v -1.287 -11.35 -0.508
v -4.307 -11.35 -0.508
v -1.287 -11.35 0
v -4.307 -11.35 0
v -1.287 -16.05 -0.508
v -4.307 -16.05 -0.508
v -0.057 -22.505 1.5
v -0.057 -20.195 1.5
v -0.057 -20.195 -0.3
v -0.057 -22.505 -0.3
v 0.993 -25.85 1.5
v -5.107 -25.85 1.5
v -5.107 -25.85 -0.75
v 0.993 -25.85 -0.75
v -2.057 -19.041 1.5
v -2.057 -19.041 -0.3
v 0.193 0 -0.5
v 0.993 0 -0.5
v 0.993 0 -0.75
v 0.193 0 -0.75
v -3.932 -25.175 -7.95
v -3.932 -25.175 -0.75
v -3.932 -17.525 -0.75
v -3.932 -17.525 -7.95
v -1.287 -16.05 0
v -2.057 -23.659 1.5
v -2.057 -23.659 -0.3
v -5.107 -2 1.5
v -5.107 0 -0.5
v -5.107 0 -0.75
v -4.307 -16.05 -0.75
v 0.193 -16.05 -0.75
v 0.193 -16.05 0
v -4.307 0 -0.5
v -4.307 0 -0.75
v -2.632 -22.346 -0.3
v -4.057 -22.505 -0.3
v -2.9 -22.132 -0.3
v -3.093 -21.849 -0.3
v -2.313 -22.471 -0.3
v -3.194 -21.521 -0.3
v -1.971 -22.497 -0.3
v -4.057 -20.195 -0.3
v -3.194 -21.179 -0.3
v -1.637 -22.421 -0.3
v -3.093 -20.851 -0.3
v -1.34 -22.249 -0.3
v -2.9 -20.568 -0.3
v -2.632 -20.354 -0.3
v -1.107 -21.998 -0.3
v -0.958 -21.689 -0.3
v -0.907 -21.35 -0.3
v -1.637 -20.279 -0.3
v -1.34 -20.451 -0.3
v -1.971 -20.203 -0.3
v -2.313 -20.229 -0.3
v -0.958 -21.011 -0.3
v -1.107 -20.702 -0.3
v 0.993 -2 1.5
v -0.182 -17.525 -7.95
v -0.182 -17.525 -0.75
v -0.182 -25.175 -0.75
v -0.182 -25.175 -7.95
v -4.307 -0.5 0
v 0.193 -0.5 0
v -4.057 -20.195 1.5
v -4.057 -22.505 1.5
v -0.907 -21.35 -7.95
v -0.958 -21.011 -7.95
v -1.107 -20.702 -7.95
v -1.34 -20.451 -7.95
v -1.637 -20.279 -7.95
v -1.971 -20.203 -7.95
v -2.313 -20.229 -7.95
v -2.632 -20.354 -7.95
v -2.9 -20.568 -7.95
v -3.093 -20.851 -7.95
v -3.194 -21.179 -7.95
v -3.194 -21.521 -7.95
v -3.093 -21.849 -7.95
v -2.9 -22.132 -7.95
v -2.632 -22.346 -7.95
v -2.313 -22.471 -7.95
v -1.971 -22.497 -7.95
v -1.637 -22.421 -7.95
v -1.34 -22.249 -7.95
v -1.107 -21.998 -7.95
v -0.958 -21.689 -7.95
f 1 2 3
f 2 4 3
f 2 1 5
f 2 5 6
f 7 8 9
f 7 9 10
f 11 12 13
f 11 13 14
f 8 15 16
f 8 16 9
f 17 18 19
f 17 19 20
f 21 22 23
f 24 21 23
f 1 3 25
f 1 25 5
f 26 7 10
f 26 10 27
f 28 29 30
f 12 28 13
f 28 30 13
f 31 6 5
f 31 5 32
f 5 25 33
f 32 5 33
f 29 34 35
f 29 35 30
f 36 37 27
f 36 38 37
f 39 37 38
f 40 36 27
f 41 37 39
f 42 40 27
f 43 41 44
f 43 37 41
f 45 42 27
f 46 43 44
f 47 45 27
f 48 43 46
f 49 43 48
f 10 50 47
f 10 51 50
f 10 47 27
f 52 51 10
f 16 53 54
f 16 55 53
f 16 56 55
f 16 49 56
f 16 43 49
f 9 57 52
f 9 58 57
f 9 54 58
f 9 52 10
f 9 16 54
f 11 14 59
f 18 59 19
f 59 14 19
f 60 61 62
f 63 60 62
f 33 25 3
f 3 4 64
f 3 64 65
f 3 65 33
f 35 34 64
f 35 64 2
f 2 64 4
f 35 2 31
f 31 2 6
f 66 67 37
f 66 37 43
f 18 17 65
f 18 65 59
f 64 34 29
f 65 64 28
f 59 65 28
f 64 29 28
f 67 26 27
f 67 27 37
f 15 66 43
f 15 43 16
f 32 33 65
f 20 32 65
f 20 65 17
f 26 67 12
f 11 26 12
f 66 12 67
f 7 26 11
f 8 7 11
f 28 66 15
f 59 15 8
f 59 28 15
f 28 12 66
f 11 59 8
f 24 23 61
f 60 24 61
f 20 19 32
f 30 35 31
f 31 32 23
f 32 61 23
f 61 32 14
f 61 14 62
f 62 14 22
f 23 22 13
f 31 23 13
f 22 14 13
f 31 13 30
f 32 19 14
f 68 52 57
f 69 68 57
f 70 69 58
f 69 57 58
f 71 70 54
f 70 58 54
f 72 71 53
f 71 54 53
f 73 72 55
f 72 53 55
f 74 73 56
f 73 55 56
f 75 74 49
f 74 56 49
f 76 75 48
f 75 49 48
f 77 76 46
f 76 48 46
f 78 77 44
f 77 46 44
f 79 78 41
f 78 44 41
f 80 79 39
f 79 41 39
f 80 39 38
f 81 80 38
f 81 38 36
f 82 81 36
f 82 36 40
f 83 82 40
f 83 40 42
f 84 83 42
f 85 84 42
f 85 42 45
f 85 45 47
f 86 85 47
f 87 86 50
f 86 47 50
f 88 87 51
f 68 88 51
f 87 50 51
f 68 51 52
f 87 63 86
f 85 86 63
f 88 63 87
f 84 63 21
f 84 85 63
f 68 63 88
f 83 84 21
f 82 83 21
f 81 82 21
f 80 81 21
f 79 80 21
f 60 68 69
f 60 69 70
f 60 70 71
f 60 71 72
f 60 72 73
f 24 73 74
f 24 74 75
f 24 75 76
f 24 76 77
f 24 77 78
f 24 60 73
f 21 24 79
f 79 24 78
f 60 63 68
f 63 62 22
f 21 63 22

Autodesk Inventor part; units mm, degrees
ref_plane "YZ Plane" through (0, 0, 0) normal (1, 0, 0) x (0, 1, 0)
ref_plane "XZ Plane" through (0, 0, 0) normal (0, 1, 0) x (-1, 0, 0)
ref_plane "XY Plane" through (0, 0, 0) normal (0, 0, 1) x (1, 0, 0)
ref_plane "Work Plane3" through (0, -0.0002, 0) normal (0, 0, 1) x (1, 0, 0)
sketch "Sketch8" plane through (0, -0.0002, 0) normal (0, 0, 1) x (1, 0, 0)
  line L0 (-0.007, 0.0002) -> (-0.007, -15.3498) projected
  line L1 (-0.007, 0.0002) -> (-4.107, 0.0002) projected
  line L2 (-4.107, 0.0002) -> (-4.107, -11.3498) projected
  line L3 (-5.107, -11.3498) -> (0.993, -11.3498)
  line L4 (0.993, -11.3498) -> (0.993, 0.0002)
  line L5 (0.993, 0.0002) -> (-5.107, 0.0002)
  line L6 (-5.107, 0.0002) -> (-5.107, -11.3498)
  line L7 (-4.107, -11.3498) -> (-1.0868, -11.3498) projected
  point P0 (-4.107, 0.0002)
  point P1 (-0.007, 0.0002)
  point P2 (-0.007, -11.3498)
  dimension "d71" = 1
  dimension "d72" = 1
extrude "side" add sketch "Sketch8" along normal blind 1.5
sketch "Sketch14" plane through (0, -0.0002, 0) normal (0, 0, -1) x (-1, 0, 0)
  line L0 (-0.993, 0) -> (5.107, 0) projected
  line L1 (5.107, -11.3498) -> (-0.993, -11.3498) projected
  line L2 (5.107, 0.0002) -> (4.307, 0.0002)
  line L3 (4.307, 0.0002) -> (4.307, -11.3498)
  line L4 (4.307, -11.3498) -> (5.107, -11.3498)
  line L5 (5.107, -11.3498) -> (5.107, 0.0002)
  line L6 (-0.993, -11.3498) -> (-0.193, -11.3498)
  line L7 (-0.193, -11.3498) -> (-0.193, 0.0002)
  line L8 (-0.193, 0.0002) -> (-0.993, 0.0002)
  line L9 (-0.993, 0.0002) -> (-0.993, -11.3498)
  line L10 (4.107, 0.0002) -> (4.107, -11.3498) projected
  line L11 (0.007, 0.0002) -> (0.007, -15.3498) projected
  point P0 (0, 0.0002)
  point P1 (-0.993, 0.0002)
  point P2 (-0.993, 0.0002)
  point P3 (-0.193, 0.0002)
  point P4 (4.307, 0.0002)
  dimension "d73" = 0.2
  dimension "d74" = 0.2
extrude "side_tabs" add sketch "Sketch14" along normal blind 0.75 contours L0 L7 L1 L9 | L0 L5 L1 L3
sketch "Sketch15" plane through (-5.107, -11.35, 1.5) normal (0, -1, 0) x (1, 0, 0)
  line L0 (0.8, -1.5) -> (5.3, -1.5) projected
  line L1 (5.3, -1.5) -> (5.3, -2.25) projected
  line L2 (6.1, -2.25) -> (5.3, -2.25) projected
  line L3 (0, 0) -> (6.1, 0) projected
  line L4 (0.8, -2.25) -> (0, -2.25) projected
  line L5 (0.8, -1.5) -> (0.8, -2.25) projected
  line L6 (5.3, -1.5) -> (0.8, -1.5) projected
  line L7 (1, -1.5) -> (4.0182, -1.5) projected
  line L8 (0.8, -1.5) -> (0.8, -2.25) projected
  line L9 (0.8, -1.5) -> (3.8202, -1.5)
  line L10 (3.8202, -1.5) -> (3.8202, -2.008)
  line L11 (3.8202, -2.008) -> (0.8, -2.008)
  line L12 (0.8, -2.008) -> (0.8, -1.5)
  line L13 (6.1, -2.25) -> (6.1, 0) projected
  line L14 (0, 0) -> (0, -2.25) projected
  line L15 (4.0202, -1.5) -> (4.0202, -2.8009) projected
  point P0 (5.107, -1.5)
  point P1 (3.8202, -1.5)
  dimension "d99" = 0.508
  dimension "d100" = 0.2
extrude "fill_gaps" add sketch "Sketch15" along normal blind 14.5
sketch "Sketch16" plane through (-5.107, -25.85, 1.5) normal (0, -1, 0) x (1, 0, 0)
  line L0 (5.3, -2.25) -> (6.1, -2.25) projected
  line L1 (5.3, -1.5) -> (5.3, -2.25) projected
  line L2 (3.8202, -1.5) -> (5.3, -1.5) projected
  line L3 (3.8202, -2.008) -> (3.8202, -1.5) projected
  line L4 (0.8, -2.008) -> (3.8202, -2.008) projected
  line L5 (0.8, -2.25) -> (0.8, -2.008) projected
  line L6 (0, -2.25) -> (0.8, -2.25) projected
  line L7 (5.3, -2.25) -> (0.8, -2.25)
  point P0 (5.107, -1.5)
extrude "fill_gaps_2" add sketch "Sketch16" against normal blind 9.8
chamfer "Chamfer1" distance 2 angle 45 1 edges at (-2.057, 0, 1.5)
sketch "Sketch17" plane through (0, -0.0002, -0.75) normal (0, 0, -1) x (-1, 0, 0)
  line L0 (0.007, -17.3498) -> (0.007, -25.3498) projected
  line L1 (4.107, -17.3498) -> (0.007, -17.3498) projected
  line L2 (4.107, -25.3498) -> (4.107, -17.3498) projected
  line L3 (0.007, -25.3498) -> (4.107, -25.3498) projected
  line L4 (0.182, -25.1748) -> (3.932, -25.1748)
  line L5 (3.932, -25.1748) -> (3.932, -17.5248)
  line L6 (3.932, -17.5248) -> (0.182, -17.5248)
  line L7 (0.182, -17.5248) -> (0.182, -25.1748)
  point P0 (0, 0.0002)
  dimension "d86" = 0.175
  dimension "d87" = 0.175
  dimension "d88" = 0.175
  dimension "d89" = 0.175
extrude "sliding_block" add sketch "Sketch17" along normal blind 7.2 contours L7 L6 L5 L4
ref_plane "Work Plane4" through (-2.2725, -22.3901, 1.5) normal (0, 0, 1) x (1, 0, 0)
sketch "Sketch19" plane through (-2.2725, -22.3901, 1.5) normal (0, 0, 1) x (1, 0, 0)
  circle A0 centre (0.2155, 1.0401) radius 1.15 projected
  point P0 (2.2725, 22.3901)
extrude "screw_hole" cut sketch "Sketch19" against normal through all
sketch "Sketch20" plane through (0, -0.0002, 1.5) normal (0, 0, 1) x (1, 0, 0)
  line L0 (-2.057, -19.0404) -> (-0.057, -20.1951)
  line L1 (-0.057, -20.1951) -> (-0.057, -22.5045)
  line L2 (-0.057, -22.5045) -> (-2.057, -23.6592)
  line L3 (-2.057, -23.6592) -> (-4.057, -22.5045)
  line L4 (-4.057, -22.5045) -> (-4.057, -20.1951)
  line L5 (-4.057, -20.1951) -> (-2.057, -19.0404)
  circle A0 centre (-2.057, -21.3498) radius 1.15 projected
  point P0 (0, 0.0002)
  dimension "d102" = 4
extrude "nut_slot" cut sketch "Sketch20" against normal blind 1.8 contours L0 L1 L2 L3 L4 L5 | A0
equation "\"d73\" = d74"
equation "\"d86\" = d89"
equation "\"d87\" = d89"
equation "\"d88\" = d89"
properties part number "surgical_holder_side2"
